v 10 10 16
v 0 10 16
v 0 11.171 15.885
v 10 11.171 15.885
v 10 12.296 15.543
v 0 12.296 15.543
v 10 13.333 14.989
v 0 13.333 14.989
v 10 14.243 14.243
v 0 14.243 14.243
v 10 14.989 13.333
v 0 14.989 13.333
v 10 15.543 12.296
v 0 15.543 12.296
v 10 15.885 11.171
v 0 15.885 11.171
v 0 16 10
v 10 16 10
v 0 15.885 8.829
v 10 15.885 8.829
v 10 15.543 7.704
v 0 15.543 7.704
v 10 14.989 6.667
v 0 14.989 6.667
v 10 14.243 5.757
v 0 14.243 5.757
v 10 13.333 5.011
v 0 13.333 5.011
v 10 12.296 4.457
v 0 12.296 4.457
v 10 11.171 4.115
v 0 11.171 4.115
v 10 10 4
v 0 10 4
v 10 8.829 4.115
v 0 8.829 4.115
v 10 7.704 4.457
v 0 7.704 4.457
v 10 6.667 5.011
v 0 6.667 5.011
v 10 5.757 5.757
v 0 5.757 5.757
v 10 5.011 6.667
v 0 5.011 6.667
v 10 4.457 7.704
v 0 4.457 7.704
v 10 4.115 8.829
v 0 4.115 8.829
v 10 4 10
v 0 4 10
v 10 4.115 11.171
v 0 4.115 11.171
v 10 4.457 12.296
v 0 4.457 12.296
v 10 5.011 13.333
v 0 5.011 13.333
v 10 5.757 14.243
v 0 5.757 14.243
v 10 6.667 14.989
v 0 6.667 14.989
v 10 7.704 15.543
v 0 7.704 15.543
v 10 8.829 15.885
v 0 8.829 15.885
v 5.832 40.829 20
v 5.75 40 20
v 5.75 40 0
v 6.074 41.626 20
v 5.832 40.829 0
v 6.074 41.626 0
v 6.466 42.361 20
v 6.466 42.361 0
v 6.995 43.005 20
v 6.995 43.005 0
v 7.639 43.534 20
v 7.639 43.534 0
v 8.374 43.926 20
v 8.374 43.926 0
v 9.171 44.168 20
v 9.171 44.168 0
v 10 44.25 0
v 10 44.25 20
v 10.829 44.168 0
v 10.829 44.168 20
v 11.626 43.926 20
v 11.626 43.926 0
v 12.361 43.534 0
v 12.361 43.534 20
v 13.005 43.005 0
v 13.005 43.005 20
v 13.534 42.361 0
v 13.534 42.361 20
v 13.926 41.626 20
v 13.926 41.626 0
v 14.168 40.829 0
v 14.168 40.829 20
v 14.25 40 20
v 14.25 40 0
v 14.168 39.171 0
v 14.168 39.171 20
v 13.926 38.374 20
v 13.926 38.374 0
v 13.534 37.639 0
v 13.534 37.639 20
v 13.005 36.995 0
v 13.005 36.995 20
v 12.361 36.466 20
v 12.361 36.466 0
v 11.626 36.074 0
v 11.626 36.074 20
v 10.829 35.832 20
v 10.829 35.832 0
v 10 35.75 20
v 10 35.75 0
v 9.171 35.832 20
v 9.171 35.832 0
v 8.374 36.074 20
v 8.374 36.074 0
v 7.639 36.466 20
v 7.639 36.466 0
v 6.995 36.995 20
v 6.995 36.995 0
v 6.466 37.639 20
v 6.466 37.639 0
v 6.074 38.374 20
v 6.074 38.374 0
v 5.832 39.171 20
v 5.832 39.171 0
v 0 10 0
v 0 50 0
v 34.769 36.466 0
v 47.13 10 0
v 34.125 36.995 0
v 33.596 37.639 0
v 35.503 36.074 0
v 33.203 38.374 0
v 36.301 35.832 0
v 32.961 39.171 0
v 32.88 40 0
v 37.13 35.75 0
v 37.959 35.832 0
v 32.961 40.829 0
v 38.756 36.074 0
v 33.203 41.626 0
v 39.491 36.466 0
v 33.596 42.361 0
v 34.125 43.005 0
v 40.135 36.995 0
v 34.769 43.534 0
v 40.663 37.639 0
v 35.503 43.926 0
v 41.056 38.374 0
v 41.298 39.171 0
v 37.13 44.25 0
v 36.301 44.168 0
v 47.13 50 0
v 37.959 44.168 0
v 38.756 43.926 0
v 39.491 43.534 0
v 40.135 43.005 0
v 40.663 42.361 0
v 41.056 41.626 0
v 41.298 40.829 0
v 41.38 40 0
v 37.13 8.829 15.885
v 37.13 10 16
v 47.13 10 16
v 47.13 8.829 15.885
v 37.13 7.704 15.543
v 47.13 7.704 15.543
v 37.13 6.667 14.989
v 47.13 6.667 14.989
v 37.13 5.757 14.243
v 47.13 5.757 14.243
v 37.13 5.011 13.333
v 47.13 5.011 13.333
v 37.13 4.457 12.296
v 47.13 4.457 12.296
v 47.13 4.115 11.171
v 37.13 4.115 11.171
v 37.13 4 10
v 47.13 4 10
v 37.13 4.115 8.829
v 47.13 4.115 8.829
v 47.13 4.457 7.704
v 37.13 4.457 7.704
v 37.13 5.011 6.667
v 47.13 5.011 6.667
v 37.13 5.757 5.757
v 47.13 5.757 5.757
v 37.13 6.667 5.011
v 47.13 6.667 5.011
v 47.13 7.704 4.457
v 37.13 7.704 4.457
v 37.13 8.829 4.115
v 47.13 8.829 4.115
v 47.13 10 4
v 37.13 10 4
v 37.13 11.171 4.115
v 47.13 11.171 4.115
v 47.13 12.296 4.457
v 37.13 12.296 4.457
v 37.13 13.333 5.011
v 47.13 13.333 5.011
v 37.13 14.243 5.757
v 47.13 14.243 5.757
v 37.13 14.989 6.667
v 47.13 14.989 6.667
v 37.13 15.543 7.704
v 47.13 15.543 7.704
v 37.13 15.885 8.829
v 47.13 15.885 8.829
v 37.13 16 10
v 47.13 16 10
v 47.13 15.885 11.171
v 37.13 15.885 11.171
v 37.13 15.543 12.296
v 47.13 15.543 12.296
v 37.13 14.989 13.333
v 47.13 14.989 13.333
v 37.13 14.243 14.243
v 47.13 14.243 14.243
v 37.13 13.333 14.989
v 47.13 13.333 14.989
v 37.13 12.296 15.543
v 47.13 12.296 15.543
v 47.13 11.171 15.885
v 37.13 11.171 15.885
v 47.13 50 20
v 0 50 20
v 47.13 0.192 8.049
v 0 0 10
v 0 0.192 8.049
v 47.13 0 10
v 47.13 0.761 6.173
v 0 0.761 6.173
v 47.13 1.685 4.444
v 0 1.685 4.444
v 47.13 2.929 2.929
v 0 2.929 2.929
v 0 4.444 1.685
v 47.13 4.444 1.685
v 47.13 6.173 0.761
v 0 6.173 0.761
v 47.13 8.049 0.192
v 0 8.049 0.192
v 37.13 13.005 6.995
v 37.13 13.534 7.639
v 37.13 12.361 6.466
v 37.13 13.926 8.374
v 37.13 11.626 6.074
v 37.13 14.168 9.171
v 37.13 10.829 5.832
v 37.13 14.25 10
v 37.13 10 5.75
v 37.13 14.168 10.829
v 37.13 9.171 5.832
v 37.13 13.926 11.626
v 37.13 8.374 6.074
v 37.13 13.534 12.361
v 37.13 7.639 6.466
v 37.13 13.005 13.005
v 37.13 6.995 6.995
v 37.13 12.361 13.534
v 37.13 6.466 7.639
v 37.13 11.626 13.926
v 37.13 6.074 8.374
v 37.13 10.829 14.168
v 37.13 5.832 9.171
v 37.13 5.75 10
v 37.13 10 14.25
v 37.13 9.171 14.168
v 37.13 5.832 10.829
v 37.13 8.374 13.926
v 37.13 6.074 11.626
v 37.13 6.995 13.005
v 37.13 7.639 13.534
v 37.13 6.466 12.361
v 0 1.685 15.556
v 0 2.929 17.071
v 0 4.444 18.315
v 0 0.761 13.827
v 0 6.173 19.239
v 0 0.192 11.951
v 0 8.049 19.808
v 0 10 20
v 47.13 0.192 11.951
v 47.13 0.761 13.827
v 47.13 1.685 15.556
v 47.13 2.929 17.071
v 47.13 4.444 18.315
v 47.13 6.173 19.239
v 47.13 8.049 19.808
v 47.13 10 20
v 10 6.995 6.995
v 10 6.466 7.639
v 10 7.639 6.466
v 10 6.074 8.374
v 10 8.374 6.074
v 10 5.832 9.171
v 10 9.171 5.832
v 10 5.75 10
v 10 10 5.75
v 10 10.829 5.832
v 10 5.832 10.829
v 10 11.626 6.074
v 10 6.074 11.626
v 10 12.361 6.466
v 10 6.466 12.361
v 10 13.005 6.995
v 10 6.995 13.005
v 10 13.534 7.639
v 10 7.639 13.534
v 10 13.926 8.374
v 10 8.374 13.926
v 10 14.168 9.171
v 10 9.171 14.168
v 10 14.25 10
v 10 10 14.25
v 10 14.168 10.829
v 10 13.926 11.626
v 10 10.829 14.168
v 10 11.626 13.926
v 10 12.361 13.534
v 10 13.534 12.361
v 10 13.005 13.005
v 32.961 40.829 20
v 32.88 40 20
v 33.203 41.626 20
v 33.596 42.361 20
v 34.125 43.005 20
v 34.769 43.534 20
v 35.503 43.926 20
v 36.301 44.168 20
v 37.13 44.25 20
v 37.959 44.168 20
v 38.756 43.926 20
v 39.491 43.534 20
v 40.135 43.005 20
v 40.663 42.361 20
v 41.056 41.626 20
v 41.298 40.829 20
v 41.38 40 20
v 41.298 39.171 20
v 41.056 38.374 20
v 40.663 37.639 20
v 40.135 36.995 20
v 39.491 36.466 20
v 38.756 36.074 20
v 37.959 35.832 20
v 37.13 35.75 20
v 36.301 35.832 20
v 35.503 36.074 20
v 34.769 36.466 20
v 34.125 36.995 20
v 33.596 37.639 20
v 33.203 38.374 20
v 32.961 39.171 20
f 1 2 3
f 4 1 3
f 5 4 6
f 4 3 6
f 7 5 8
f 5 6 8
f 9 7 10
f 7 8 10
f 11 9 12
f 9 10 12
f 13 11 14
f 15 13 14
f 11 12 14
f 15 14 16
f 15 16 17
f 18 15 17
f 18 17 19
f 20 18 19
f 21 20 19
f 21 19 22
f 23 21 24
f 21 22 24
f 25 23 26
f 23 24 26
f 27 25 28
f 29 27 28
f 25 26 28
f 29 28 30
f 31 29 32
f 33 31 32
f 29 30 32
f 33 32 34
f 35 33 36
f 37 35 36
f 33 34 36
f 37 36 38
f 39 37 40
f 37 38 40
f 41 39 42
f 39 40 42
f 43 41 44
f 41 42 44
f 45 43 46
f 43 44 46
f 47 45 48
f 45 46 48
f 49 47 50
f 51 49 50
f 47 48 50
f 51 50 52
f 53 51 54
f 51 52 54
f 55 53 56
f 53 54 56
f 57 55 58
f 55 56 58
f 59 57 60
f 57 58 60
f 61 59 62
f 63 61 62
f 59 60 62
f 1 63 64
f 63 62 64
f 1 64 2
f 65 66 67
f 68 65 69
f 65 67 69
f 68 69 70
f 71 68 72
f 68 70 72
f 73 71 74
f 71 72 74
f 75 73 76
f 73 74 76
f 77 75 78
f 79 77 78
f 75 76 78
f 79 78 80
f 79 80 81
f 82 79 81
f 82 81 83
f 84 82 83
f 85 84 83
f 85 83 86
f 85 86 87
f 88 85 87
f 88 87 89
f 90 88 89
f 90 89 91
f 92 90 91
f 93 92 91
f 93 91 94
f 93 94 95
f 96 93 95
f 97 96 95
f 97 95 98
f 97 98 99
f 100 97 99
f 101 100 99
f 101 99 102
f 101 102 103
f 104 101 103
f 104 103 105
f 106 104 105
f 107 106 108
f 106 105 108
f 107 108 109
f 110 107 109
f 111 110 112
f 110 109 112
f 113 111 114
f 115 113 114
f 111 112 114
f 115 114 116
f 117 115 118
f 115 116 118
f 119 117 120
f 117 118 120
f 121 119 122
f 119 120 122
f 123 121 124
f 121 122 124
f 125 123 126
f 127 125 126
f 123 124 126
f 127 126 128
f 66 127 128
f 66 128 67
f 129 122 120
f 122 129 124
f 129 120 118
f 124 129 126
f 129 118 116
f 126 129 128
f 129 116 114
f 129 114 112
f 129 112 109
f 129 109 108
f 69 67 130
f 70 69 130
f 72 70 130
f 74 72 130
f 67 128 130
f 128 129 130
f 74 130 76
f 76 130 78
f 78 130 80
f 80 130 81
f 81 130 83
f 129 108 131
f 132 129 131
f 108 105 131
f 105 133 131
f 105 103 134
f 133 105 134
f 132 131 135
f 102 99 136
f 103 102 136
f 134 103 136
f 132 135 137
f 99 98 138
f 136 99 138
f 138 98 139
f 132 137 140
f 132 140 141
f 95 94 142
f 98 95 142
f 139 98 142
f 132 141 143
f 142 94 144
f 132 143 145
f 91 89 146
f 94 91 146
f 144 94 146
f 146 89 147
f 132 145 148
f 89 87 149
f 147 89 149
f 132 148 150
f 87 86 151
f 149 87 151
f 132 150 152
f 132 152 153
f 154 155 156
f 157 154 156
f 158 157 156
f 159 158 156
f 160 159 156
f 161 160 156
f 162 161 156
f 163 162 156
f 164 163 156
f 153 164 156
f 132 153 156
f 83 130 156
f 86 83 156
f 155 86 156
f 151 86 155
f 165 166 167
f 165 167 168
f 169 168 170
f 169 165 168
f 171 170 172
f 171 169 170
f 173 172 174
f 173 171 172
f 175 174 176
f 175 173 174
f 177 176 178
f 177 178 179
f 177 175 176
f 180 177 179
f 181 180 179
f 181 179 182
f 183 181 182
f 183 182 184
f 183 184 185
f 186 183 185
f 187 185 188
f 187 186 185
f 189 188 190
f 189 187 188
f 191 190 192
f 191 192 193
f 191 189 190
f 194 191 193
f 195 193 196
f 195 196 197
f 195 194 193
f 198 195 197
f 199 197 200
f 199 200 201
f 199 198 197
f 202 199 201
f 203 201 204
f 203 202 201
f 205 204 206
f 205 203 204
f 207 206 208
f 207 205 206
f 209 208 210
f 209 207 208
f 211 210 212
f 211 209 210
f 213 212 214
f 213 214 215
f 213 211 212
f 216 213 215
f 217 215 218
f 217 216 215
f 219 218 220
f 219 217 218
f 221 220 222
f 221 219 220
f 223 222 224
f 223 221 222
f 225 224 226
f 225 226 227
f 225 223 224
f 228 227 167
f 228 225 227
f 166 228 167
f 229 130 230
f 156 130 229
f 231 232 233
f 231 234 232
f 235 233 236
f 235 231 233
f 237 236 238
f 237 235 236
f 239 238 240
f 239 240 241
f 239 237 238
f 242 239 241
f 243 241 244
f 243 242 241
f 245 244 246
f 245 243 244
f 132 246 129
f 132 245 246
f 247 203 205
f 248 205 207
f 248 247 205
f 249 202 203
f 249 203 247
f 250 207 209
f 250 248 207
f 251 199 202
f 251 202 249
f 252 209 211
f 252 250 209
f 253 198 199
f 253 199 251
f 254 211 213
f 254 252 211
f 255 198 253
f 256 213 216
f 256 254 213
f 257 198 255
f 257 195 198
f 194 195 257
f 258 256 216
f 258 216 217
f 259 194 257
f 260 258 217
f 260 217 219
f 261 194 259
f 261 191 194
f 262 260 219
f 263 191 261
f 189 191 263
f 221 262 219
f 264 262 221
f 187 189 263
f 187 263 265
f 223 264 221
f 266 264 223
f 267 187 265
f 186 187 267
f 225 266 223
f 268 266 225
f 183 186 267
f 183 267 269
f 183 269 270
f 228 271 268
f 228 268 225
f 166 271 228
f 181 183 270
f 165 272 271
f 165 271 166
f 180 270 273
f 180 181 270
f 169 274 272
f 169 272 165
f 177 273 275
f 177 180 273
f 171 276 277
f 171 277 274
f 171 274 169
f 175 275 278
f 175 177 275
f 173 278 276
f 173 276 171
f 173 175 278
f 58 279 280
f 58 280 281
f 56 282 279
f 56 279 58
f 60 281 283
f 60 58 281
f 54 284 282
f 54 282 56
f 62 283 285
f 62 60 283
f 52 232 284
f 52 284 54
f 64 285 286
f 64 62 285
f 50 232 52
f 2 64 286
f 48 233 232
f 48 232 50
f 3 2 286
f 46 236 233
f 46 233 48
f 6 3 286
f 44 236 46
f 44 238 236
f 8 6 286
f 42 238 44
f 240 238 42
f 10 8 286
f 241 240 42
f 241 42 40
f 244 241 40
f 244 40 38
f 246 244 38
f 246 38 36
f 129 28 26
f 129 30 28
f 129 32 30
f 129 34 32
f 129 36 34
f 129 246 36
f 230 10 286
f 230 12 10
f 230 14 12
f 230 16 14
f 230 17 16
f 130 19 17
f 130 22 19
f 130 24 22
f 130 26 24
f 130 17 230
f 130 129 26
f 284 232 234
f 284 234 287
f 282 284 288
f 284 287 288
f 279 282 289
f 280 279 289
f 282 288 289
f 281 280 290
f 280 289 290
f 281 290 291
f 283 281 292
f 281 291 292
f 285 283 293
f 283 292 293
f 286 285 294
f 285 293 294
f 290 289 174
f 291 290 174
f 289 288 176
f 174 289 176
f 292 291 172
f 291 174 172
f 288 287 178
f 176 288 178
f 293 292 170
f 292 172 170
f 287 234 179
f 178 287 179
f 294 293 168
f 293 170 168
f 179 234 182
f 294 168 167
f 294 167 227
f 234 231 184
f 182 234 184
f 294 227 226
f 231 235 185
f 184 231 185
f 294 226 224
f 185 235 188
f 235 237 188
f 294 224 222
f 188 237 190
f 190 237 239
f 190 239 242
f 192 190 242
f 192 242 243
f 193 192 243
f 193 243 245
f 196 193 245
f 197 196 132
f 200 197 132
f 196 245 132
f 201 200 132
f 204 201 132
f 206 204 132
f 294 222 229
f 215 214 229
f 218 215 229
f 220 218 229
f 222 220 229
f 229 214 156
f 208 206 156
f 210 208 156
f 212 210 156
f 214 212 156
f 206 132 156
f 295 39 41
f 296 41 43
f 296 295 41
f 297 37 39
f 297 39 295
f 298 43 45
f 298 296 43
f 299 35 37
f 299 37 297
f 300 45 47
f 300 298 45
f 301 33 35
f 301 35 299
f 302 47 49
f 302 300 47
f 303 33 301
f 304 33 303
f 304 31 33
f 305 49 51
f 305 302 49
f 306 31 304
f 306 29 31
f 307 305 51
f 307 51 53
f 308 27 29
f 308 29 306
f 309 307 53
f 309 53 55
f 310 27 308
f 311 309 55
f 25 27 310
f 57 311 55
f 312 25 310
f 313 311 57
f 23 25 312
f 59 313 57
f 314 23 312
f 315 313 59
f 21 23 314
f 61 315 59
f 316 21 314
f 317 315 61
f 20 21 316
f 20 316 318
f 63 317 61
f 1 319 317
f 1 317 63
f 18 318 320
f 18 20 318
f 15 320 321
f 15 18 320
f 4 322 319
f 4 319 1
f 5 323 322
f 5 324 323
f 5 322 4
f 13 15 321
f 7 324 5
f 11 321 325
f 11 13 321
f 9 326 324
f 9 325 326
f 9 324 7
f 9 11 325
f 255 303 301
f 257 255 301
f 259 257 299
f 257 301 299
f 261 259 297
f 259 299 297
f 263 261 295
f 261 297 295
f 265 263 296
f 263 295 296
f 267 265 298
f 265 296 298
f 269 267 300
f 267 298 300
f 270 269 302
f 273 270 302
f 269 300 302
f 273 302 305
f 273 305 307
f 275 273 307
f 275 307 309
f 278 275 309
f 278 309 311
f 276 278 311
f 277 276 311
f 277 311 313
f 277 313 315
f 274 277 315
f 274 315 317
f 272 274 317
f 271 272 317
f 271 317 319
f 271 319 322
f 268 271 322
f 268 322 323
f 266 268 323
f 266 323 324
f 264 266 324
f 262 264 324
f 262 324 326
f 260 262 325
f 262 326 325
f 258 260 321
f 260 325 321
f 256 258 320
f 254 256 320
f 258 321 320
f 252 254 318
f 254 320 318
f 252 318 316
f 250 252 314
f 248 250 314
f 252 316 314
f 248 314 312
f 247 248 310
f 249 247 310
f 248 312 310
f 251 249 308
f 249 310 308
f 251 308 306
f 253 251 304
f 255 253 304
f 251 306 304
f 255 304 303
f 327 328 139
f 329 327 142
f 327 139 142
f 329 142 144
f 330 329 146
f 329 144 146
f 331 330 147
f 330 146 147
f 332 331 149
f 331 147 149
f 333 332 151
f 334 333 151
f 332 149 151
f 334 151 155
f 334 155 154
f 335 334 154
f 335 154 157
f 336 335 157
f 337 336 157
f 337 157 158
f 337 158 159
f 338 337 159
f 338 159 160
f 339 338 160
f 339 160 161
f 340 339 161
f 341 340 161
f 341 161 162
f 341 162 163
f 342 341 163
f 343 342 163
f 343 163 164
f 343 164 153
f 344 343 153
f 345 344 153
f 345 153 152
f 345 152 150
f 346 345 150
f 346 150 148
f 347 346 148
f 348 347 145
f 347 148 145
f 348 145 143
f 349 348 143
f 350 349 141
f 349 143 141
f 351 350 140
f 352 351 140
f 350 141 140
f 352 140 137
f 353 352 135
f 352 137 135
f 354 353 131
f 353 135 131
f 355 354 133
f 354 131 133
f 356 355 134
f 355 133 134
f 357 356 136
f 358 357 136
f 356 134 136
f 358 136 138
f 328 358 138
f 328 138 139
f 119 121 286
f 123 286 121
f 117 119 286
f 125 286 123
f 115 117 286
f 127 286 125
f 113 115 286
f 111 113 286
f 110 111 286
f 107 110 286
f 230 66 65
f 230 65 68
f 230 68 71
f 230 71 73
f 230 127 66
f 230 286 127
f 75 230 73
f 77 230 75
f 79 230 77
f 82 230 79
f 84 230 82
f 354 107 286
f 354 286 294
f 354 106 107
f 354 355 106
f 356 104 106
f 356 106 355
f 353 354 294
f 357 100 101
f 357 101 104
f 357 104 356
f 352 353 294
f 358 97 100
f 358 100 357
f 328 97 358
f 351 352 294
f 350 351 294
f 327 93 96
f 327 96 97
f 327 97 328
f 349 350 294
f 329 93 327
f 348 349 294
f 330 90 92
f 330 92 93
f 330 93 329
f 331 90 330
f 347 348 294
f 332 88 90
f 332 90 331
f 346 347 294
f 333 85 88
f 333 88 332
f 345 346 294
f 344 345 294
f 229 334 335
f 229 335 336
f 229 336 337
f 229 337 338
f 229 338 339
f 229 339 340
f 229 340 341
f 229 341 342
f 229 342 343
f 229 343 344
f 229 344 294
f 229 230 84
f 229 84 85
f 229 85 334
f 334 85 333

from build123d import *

# Parameters (mm, degrees)
SKETCH1_W                      = 47.129705535
SKETCH1_H                      = 50
EXTRUDE1_DEPTH                 = 20
F_8_5_8_5_DIAMETER_HOLE1_D     = 8.5
F_8_5_8_5_DIAMETER_HOLE1_DEPTH = 47.13
F_8_5_8_5_DIAMETER_HOLE1_TIP   = 2.553657631
SKETCH4_R                      = 6
EXTRUDE2_DEPTH                 = 10
EXTRUDE3_START                 = -10
SKETCH3_R                      = 6
EXTRUDE3_DEPTH                 = 10
F_8_5_8_5_DIAMETER_HOLE2_D     = 8.5
FILLET1_R                      = 10


with BuildPart() as part:
    # Sketch1 → Extrude1 (new body)
    with BuildSketch(Plane.XY):
        with Locations((23.564852768, 25)):
            Rectangle(SKETCH1_W, SKETCH1_H)
    extrude(amount=EXTRUDE1_DEPTH)

    # Ø8.5 (8.5) Diameter Hole1
    with Locations(Plane(origin=(47.129705535, 10, 10), x_dir=(0, 0, 1), z_dir=(1, 0, 0))):
        with Locations((0, 0)):
            Hole(F_8_5_8_5_DIAMETER_HOLE1_D / 2, depth=F_8_5_8_5_DIAMETER_HOLE1_DEPTH)
            with Locations((0, 0, -(F_8_5_8_5_DIAMETER_HOLE1_DEPTH + F_8_5_8_5_DIAMETER_HOLE1_TIP / 2))):  # 118° drill point
                Cone(0, F_8_5_8_5_DIAMETER_HOLE1_D / 2, F_8_5_8_5_DIAMETER_HOLE1_TIP, mode=Mode.SUBTRACT)

    # Sketch4 → Extrude2 (cut)
    with BuildSketch(Plane.ZY):
        with Locations((10, 10)):
            Circle(SKETCH4_R)
    extrude(amount=-EXTRUDE2_DEPTH, mode=Mode.SUBTRACT)

    # Sketch3 → Extrude3 (cut)
    with BuildSketch(Plane(origin=(47.129705535, 0, 0), x_dir=(0, 0, -1), z_dir=(1, 0, 0)).offset(EXTRUDE3_START)):
        with Locations(Location((-10, 10, 0), (0, 0, 180))):
            Circle(SKETCH3_R)
    extrude(amount=EXTRUDE3_DEPTH, mode=Mode.SUBTRACT)

    # Ø8.5 (8.5) Diameter Hole2 (through all)
    with Locations(Plane(origin=(37.129705535, 40, 20), x_dir=(1, 0, 0), z_dir=(0, 0, 1))):
        with Locations((0, 0), (-27.129705535, 0)):
            Hole(F_8_5_8_5_DIAMETER_HOLE2_D / 2)

    # Fillet1
    fillet1_edges = [part.edges().sort_by_distance(p)[0] for p in [
        (23.564852768, 0, 20),
        (23.564852768, 0, 0),
    ]]
    fillet(fillet1_edges, radius=FILLET1_R - 0.0001)  # a hair under: the kernel refuses the full size


solid = part.part
